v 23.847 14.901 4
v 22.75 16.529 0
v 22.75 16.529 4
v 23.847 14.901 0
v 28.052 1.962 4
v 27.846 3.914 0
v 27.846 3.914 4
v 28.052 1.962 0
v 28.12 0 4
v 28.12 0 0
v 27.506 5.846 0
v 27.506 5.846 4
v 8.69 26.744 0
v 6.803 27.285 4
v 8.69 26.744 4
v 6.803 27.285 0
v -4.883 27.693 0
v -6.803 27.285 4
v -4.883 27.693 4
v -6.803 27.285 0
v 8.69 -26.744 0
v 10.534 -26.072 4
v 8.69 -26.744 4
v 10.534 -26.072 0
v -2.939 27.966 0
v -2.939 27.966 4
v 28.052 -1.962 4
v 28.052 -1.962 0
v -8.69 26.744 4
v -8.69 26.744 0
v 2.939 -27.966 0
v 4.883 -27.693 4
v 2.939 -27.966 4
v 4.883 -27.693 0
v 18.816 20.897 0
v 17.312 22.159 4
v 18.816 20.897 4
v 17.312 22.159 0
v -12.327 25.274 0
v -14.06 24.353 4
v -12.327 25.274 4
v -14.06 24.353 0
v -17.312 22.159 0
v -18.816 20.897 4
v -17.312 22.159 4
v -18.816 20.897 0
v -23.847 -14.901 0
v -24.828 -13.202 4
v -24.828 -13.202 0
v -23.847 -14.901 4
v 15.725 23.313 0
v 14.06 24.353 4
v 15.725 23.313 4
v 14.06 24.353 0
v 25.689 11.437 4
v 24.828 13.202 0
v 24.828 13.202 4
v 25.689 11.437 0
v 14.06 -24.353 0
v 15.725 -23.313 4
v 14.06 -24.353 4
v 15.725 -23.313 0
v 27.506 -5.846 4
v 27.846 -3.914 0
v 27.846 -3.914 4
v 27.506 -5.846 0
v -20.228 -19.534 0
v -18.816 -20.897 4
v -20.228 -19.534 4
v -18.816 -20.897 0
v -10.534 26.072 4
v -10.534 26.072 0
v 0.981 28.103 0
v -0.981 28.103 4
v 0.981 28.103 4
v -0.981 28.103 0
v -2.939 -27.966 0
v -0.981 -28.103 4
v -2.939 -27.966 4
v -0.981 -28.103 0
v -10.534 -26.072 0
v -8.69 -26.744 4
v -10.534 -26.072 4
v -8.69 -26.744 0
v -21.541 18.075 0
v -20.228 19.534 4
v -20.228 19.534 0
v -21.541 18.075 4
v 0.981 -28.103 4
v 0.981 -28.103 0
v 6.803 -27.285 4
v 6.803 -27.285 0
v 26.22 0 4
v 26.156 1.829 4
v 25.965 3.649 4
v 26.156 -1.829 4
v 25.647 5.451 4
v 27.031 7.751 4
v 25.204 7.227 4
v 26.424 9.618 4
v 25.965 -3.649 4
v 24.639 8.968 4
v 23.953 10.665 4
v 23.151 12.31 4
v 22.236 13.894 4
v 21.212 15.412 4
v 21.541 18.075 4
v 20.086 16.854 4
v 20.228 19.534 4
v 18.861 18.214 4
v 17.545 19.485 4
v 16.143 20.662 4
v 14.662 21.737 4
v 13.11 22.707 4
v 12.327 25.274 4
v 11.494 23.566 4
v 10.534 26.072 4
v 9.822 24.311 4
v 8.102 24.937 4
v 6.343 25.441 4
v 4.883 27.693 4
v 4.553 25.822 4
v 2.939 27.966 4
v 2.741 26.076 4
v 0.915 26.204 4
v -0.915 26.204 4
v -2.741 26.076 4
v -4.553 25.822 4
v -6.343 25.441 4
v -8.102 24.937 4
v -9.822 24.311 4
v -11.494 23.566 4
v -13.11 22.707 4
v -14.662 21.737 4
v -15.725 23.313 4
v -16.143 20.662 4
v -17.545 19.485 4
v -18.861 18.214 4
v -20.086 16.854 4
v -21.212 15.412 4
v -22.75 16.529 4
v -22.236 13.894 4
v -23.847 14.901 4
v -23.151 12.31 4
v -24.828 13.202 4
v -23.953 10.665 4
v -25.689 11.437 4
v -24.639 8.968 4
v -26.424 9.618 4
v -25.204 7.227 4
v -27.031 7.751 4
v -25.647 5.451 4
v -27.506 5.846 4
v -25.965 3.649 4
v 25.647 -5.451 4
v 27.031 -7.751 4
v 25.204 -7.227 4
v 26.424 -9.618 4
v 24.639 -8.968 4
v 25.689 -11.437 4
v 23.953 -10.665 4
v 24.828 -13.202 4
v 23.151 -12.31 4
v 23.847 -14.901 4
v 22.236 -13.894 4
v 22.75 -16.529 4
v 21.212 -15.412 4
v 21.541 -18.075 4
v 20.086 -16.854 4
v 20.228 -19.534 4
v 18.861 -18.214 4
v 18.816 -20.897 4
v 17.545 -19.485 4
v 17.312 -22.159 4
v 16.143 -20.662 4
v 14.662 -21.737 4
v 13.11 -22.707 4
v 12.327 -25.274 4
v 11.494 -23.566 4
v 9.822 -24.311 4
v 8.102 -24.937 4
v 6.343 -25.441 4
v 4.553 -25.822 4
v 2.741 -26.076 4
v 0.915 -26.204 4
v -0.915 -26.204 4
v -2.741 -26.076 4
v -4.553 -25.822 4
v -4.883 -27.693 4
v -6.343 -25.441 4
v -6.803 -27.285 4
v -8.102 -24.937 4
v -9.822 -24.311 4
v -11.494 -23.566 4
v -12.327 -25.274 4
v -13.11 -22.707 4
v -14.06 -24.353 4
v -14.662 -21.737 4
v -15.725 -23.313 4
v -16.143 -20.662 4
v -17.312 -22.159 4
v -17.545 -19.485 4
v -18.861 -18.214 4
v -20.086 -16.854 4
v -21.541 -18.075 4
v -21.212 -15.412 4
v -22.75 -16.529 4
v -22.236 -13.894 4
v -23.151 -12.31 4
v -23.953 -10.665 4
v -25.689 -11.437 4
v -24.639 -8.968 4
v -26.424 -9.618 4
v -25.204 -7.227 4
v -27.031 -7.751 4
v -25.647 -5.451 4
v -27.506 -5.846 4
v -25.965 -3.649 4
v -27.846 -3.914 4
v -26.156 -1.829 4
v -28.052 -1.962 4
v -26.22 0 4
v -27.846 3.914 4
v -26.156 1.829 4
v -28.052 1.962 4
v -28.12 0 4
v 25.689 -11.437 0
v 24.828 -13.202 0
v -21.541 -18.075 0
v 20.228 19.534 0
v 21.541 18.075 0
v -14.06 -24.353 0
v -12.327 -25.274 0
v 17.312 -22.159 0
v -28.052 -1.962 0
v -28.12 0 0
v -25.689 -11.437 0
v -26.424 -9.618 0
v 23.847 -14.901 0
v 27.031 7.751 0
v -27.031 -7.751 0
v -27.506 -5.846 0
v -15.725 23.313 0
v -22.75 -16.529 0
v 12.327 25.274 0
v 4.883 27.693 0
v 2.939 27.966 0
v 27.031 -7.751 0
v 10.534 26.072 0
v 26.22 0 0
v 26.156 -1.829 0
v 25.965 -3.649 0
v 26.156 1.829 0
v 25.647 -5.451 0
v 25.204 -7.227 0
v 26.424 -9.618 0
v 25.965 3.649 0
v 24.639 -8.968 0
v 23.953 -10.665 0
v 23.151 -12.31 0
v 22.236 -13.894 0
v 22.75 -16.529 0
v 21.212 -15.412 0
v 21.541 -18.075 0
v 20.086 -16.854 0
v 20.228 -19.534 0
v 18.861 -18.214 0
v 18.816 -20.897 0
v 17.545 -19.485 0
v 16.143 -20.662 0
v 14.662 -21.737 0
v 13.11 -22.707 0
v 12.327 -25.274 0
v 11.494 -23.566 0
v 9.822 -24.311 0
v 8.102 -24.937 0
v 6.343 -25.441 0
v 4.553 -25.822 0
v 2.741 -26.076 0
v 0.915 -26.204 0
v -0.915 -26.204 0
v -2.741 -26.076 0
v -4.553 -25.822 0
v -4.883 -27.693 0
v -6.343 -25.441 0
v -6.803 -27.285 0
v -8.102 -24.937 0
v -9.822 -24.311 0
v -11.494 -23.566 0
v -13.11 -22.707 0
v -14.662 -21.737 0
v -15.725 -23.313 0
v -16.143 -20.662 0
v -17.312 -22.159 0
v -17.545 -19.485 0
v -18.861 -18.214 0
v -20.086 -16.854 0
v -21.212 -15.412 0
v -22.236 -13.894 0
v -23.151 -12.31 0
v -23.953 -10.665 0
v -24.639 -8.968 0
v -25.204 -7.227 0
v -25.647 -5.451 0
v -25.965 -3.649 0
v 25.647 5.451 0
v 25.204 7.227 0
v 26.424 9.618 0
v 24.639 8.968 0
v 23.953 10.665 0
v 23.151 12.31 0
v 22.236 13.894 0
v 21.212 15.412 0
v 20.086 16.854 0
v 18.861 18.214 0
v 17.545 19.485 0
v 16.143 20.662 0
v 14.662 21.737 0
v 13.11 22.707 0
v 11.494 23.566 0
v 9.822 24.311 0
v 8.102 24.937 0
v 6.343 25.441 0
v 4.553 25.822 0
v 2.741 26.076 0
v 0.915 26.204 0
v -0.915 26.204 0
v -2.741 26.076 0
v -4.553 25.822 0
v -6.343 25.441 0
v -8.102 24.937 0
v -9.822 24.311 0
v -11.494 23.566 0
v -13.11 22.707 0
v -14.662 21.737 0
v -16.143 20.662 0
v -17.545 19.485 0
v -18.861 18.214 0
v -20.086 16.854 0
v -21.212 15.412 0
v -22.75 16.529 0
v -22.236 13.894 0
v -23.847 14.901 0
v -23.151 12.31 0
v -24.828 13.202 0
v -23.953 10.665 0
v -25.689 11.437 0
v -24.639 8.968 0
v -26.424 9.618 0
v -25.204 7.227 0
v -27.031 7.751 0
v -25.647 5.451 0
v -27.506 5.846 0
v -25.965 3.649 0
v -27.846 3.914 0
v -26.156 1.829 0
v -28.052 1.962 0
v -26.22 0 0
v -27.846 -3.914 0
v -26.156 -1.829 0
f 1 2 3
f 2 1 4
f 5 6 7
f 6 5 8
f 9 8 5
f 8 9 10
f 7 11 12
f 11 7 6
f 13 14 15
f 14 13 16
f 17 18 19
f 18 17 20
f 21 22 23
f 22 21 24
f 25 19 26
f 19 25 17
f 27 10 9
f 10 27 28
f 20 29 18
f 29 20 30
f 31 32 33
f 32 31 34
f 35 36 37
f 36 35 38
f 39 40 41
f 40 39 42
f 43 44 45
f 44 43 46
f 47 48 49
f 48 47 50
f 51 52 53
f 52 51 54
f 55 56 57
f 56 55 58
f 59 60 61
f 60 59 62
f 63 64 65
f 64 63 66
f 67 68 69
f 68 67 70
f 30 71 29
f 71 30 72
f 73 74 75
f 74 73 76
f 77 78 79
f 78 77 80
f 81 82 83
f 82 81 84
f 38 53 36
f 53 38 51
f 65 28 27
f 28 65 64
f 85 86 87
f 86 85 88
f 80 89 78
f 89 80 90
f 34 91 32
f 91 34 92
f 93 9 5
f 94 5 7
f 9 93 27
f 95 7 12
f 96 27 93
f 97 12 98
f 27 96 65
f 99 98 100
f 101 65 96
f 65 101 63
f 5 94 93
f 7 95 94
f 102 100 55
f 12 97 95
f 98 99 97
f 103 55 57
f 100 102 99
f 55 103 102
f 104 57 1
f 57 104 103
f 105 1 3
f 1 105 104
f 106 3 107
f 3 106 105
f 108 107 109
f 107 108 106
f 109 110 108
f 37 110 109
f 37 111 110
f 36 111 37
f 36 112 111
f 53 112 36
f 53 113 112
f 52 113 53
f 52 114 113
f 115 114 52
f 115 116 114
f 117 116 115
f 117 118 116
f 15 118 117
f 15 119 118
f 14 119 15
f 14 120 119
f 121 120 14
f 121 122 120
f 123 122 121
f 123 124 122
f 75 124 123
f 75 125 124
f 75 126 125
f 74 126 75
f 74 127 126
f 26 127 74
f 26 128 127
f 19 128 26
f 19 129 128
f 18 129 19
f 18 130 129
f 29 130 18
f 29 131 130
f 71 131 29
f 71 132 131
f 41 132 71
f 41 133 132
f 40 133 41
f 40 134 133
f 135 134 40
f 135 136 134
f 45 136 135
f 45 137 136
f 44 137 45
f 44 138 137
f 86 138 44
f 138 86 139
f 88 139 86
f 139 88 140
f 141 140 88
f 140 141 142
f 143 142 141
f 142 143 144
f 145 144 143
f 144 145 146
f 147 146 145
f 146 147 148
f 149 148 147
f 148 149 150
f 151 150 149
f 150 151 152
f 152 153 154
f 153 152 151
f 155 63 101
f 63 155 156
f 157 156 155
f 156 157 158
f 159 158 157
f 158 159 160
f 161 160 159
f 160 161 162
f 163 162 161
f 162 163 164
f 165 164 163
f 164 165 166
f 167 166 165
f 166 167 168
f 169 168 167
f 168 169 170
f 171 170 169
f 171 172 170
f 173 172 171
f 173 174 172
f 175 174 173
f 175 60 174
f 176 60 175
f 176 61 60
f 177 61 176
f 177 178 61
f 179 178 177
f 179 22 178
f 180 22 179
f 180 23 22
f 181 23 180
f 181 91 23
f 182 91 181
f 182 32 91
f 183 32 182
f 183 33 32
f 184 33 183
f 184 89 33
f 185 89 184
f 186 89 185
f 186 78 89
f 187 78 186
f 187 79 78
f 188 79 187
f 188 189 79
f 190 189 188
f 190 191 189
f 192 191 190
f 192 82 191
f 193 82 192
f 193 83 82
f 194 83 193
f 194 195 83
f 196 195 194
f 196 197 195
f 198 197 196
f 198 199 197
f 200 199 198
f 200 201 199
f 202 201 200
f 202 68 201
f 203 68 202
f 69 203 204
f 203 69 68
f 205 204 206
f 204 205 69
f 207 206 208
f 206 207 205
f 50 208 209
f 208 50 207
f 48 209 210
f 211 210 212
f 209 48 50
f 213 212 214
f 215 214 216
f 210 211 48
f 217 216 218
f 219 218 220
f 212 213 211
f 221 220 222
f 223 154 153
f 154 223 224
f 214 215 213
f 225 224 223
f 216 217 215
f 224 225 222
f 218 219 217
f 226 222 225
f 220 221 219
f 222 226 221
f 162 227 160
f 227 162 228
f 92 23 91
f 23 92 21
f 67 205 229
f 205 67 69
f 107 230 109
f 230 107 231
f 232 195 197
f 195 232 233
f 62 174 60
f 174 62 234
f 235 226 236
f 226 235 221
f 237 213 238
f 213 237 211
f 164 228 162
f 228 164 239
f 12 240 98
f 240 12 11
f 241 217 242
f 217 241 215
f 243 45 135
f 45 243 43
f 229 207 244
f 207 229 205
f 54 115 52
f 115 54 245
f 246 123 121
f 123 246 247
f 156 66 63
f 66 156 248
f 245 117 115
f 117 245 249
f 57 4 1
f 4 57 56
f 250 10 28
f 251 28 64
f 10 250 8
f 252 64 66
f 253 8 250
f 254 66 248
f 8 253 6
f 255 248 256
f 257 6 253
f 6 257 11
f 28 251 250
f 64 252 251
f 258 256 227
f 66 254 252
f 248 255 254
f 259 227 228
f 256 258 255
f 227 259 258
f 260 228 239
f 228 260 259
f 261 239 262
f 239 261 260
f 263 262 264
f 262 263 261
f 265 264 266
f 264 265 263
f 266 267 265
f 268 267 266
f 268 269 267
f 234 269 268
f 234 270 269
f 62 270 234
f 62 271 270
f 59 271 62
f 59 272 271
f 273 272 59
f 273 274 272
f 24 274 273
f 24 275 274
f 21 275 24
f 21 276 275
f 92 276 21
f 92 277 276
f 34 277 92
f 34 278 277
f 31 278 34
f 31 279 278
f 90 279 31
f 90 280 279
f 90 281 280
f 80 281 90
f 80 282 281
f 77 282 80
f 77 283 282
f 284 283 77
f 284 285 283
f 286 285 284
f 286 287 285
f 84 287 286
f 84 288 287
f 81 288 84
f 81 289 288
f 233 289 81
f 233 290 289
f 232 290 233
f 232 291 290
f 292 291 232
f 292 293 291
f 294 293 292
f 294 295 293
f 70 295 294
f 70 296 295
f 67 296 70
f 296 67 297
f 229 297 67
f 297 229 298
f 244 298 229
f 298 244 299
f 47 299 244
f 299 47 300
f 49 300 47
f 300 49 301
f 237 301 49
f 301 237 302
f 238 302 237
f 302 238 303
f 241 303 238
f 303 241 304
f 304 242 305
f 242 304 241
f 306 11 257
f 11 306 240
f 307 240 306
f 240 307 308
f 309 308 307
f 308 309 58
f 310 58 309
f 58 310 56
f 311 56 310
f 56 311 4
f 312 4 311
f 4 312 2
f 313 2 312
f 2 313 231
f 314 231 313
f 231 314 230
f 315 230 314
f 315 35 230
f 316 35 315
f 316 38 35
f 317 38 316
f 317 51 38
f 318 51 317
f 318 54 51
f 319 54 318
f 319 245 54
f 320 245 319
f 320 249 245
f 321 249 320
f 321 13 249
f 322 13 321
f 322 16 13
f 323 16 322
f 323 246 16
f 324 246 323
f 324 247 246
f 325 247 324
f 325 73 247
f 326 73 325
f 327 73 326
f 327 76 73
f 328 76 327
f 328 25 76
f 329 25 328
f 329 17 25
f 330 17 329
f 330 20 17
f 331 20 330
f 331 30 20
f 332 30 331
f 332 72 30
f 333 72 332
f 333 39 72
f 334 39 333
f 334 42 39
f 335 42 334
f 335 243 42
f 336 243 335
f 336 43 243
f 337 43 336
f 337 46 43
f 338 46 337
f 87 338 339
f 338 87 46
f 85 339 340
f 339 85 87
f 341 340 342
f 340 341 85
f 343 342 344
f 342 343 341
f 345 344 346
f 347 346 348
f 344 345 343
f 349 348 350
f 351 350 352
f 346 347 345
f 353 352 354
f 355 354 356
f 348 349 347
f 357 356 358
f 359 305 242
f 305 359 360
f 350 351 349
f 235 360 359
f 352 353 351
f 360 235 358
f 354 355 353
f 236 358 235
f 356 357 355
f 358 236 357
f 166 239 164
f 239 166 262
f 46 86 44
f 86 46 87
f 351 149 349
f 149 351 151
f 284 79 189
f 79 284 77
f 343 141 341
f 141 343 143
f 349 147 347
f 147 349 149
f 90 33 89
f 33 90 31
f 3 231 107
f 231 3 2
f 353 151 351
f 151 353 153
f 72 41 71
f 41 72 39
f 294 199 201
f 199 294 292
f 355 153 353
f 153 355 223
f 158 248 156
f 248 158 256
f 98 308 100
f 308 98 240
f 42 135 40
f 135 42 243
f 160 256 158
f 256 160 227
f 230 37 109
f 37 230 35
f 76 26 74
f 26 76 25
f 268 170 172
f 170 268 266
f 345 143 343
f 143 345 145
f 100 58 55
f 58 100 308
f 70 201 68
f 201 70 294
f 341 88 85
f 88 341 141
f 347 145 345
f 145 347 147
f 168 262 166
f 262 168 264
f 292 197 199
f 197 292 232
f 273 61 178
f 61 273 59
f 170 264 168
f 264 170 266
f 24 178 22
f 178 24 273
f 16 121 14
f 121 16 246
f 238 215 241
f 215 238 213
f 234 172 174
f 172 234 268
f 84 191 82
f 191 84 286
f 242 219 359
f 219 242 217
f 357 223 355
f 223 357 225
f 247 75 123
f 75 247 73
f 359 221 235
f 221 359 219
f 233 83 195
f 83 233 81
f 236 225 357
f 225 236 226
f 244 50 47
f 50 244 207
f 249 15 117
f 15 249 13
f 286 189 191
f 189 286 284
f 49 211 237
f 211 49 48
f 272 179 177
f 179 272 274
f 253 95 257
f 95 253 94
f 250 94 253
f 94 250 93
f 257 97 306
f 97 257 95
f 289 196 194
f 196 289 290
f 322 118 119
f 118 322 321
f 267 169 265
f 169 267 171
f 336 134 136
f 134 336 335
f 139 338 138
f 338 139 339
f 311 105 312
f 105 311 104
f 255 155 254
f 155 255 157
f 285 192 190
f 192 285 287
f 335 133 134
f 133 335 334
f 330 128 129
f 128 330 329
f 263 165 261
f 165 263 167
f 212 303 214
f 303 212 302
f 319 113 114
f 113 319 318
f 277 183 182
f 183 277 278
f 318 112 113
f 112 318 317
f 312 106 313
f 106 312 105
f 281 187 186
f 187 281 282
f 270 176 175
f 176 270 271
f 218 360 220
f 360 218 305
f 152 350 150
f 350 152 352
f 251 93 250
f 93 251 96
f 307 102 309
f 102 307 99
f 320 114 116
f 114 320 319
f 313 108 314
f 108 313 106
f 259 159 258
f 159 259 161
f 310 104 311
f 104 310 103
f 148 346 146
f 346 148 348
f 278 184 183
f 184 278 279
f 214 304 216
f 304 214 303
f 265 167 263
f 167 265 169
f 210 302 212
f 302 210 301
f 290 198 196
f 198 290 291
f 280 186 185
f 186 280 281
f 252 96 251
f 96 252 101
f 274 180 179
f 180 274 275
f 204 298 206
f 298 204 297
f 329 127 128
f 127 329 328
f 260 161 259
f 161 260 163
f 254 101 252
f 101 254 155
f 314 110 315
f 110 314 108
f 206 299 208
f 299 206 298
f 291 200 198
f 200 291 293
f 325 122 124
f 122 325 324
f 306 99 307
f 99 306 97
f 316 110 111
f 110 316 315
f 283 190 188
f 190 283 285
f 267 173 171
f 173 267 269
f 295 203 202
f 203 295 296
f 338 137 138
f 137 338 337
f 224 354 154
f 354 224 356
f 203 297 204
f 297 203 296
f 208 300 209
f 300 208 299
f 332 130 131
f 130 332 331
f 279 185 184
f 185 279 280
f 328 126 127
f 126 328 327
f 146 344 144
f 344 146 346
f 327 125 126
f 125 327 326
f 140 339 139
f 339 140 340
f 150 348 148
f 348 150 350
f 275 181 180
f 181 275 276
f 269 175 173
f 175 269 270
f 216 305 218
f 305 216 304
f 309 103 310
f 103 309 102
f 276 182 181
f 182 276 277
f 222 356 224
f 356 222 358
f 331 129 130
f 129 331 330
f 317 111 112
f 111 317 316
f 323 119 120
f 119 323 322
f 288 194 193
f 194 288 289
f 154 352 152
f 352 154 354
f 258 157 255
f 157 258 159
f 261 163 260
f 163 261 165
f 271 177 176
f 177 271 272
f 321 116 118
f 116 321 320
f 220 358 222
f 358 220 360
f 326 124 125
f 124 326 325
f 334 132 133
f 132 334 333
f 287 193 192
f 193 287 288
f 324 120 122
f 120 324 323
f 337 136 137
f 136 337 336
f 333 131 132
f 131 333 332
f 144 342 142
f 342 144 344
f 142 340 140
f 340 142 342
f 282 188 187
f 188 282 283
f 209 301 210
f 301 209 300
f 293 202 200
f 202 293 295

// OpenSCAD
$fn = 90;

eps = 0.01;

h = 65;
d1 = 51.74 + 0.5;     // cup diameter
d2 = 18.7;            // tray hole diameter
w2 = 49.67;           // tray hole outside distance

r2 = (w2 - d2) / 2;   // tray hole offset

module main() {
  cylinder(h, d2 = w2, d1 = d1 + 2);
  for (x = [-r2, r2])
    translate([x, 0, h])
      cylinder(3, d=d2 - .2);
}

module lockring() {
  difference() {
    cylinder(4, d = d1 + 4);
    translate([0,0,-eps])
      cylinder(5, d = d1 + .2);
  }
}

// difference() {
//   main();
//   translate([0,0,-1])
//     lockring();
// }

lockring();
